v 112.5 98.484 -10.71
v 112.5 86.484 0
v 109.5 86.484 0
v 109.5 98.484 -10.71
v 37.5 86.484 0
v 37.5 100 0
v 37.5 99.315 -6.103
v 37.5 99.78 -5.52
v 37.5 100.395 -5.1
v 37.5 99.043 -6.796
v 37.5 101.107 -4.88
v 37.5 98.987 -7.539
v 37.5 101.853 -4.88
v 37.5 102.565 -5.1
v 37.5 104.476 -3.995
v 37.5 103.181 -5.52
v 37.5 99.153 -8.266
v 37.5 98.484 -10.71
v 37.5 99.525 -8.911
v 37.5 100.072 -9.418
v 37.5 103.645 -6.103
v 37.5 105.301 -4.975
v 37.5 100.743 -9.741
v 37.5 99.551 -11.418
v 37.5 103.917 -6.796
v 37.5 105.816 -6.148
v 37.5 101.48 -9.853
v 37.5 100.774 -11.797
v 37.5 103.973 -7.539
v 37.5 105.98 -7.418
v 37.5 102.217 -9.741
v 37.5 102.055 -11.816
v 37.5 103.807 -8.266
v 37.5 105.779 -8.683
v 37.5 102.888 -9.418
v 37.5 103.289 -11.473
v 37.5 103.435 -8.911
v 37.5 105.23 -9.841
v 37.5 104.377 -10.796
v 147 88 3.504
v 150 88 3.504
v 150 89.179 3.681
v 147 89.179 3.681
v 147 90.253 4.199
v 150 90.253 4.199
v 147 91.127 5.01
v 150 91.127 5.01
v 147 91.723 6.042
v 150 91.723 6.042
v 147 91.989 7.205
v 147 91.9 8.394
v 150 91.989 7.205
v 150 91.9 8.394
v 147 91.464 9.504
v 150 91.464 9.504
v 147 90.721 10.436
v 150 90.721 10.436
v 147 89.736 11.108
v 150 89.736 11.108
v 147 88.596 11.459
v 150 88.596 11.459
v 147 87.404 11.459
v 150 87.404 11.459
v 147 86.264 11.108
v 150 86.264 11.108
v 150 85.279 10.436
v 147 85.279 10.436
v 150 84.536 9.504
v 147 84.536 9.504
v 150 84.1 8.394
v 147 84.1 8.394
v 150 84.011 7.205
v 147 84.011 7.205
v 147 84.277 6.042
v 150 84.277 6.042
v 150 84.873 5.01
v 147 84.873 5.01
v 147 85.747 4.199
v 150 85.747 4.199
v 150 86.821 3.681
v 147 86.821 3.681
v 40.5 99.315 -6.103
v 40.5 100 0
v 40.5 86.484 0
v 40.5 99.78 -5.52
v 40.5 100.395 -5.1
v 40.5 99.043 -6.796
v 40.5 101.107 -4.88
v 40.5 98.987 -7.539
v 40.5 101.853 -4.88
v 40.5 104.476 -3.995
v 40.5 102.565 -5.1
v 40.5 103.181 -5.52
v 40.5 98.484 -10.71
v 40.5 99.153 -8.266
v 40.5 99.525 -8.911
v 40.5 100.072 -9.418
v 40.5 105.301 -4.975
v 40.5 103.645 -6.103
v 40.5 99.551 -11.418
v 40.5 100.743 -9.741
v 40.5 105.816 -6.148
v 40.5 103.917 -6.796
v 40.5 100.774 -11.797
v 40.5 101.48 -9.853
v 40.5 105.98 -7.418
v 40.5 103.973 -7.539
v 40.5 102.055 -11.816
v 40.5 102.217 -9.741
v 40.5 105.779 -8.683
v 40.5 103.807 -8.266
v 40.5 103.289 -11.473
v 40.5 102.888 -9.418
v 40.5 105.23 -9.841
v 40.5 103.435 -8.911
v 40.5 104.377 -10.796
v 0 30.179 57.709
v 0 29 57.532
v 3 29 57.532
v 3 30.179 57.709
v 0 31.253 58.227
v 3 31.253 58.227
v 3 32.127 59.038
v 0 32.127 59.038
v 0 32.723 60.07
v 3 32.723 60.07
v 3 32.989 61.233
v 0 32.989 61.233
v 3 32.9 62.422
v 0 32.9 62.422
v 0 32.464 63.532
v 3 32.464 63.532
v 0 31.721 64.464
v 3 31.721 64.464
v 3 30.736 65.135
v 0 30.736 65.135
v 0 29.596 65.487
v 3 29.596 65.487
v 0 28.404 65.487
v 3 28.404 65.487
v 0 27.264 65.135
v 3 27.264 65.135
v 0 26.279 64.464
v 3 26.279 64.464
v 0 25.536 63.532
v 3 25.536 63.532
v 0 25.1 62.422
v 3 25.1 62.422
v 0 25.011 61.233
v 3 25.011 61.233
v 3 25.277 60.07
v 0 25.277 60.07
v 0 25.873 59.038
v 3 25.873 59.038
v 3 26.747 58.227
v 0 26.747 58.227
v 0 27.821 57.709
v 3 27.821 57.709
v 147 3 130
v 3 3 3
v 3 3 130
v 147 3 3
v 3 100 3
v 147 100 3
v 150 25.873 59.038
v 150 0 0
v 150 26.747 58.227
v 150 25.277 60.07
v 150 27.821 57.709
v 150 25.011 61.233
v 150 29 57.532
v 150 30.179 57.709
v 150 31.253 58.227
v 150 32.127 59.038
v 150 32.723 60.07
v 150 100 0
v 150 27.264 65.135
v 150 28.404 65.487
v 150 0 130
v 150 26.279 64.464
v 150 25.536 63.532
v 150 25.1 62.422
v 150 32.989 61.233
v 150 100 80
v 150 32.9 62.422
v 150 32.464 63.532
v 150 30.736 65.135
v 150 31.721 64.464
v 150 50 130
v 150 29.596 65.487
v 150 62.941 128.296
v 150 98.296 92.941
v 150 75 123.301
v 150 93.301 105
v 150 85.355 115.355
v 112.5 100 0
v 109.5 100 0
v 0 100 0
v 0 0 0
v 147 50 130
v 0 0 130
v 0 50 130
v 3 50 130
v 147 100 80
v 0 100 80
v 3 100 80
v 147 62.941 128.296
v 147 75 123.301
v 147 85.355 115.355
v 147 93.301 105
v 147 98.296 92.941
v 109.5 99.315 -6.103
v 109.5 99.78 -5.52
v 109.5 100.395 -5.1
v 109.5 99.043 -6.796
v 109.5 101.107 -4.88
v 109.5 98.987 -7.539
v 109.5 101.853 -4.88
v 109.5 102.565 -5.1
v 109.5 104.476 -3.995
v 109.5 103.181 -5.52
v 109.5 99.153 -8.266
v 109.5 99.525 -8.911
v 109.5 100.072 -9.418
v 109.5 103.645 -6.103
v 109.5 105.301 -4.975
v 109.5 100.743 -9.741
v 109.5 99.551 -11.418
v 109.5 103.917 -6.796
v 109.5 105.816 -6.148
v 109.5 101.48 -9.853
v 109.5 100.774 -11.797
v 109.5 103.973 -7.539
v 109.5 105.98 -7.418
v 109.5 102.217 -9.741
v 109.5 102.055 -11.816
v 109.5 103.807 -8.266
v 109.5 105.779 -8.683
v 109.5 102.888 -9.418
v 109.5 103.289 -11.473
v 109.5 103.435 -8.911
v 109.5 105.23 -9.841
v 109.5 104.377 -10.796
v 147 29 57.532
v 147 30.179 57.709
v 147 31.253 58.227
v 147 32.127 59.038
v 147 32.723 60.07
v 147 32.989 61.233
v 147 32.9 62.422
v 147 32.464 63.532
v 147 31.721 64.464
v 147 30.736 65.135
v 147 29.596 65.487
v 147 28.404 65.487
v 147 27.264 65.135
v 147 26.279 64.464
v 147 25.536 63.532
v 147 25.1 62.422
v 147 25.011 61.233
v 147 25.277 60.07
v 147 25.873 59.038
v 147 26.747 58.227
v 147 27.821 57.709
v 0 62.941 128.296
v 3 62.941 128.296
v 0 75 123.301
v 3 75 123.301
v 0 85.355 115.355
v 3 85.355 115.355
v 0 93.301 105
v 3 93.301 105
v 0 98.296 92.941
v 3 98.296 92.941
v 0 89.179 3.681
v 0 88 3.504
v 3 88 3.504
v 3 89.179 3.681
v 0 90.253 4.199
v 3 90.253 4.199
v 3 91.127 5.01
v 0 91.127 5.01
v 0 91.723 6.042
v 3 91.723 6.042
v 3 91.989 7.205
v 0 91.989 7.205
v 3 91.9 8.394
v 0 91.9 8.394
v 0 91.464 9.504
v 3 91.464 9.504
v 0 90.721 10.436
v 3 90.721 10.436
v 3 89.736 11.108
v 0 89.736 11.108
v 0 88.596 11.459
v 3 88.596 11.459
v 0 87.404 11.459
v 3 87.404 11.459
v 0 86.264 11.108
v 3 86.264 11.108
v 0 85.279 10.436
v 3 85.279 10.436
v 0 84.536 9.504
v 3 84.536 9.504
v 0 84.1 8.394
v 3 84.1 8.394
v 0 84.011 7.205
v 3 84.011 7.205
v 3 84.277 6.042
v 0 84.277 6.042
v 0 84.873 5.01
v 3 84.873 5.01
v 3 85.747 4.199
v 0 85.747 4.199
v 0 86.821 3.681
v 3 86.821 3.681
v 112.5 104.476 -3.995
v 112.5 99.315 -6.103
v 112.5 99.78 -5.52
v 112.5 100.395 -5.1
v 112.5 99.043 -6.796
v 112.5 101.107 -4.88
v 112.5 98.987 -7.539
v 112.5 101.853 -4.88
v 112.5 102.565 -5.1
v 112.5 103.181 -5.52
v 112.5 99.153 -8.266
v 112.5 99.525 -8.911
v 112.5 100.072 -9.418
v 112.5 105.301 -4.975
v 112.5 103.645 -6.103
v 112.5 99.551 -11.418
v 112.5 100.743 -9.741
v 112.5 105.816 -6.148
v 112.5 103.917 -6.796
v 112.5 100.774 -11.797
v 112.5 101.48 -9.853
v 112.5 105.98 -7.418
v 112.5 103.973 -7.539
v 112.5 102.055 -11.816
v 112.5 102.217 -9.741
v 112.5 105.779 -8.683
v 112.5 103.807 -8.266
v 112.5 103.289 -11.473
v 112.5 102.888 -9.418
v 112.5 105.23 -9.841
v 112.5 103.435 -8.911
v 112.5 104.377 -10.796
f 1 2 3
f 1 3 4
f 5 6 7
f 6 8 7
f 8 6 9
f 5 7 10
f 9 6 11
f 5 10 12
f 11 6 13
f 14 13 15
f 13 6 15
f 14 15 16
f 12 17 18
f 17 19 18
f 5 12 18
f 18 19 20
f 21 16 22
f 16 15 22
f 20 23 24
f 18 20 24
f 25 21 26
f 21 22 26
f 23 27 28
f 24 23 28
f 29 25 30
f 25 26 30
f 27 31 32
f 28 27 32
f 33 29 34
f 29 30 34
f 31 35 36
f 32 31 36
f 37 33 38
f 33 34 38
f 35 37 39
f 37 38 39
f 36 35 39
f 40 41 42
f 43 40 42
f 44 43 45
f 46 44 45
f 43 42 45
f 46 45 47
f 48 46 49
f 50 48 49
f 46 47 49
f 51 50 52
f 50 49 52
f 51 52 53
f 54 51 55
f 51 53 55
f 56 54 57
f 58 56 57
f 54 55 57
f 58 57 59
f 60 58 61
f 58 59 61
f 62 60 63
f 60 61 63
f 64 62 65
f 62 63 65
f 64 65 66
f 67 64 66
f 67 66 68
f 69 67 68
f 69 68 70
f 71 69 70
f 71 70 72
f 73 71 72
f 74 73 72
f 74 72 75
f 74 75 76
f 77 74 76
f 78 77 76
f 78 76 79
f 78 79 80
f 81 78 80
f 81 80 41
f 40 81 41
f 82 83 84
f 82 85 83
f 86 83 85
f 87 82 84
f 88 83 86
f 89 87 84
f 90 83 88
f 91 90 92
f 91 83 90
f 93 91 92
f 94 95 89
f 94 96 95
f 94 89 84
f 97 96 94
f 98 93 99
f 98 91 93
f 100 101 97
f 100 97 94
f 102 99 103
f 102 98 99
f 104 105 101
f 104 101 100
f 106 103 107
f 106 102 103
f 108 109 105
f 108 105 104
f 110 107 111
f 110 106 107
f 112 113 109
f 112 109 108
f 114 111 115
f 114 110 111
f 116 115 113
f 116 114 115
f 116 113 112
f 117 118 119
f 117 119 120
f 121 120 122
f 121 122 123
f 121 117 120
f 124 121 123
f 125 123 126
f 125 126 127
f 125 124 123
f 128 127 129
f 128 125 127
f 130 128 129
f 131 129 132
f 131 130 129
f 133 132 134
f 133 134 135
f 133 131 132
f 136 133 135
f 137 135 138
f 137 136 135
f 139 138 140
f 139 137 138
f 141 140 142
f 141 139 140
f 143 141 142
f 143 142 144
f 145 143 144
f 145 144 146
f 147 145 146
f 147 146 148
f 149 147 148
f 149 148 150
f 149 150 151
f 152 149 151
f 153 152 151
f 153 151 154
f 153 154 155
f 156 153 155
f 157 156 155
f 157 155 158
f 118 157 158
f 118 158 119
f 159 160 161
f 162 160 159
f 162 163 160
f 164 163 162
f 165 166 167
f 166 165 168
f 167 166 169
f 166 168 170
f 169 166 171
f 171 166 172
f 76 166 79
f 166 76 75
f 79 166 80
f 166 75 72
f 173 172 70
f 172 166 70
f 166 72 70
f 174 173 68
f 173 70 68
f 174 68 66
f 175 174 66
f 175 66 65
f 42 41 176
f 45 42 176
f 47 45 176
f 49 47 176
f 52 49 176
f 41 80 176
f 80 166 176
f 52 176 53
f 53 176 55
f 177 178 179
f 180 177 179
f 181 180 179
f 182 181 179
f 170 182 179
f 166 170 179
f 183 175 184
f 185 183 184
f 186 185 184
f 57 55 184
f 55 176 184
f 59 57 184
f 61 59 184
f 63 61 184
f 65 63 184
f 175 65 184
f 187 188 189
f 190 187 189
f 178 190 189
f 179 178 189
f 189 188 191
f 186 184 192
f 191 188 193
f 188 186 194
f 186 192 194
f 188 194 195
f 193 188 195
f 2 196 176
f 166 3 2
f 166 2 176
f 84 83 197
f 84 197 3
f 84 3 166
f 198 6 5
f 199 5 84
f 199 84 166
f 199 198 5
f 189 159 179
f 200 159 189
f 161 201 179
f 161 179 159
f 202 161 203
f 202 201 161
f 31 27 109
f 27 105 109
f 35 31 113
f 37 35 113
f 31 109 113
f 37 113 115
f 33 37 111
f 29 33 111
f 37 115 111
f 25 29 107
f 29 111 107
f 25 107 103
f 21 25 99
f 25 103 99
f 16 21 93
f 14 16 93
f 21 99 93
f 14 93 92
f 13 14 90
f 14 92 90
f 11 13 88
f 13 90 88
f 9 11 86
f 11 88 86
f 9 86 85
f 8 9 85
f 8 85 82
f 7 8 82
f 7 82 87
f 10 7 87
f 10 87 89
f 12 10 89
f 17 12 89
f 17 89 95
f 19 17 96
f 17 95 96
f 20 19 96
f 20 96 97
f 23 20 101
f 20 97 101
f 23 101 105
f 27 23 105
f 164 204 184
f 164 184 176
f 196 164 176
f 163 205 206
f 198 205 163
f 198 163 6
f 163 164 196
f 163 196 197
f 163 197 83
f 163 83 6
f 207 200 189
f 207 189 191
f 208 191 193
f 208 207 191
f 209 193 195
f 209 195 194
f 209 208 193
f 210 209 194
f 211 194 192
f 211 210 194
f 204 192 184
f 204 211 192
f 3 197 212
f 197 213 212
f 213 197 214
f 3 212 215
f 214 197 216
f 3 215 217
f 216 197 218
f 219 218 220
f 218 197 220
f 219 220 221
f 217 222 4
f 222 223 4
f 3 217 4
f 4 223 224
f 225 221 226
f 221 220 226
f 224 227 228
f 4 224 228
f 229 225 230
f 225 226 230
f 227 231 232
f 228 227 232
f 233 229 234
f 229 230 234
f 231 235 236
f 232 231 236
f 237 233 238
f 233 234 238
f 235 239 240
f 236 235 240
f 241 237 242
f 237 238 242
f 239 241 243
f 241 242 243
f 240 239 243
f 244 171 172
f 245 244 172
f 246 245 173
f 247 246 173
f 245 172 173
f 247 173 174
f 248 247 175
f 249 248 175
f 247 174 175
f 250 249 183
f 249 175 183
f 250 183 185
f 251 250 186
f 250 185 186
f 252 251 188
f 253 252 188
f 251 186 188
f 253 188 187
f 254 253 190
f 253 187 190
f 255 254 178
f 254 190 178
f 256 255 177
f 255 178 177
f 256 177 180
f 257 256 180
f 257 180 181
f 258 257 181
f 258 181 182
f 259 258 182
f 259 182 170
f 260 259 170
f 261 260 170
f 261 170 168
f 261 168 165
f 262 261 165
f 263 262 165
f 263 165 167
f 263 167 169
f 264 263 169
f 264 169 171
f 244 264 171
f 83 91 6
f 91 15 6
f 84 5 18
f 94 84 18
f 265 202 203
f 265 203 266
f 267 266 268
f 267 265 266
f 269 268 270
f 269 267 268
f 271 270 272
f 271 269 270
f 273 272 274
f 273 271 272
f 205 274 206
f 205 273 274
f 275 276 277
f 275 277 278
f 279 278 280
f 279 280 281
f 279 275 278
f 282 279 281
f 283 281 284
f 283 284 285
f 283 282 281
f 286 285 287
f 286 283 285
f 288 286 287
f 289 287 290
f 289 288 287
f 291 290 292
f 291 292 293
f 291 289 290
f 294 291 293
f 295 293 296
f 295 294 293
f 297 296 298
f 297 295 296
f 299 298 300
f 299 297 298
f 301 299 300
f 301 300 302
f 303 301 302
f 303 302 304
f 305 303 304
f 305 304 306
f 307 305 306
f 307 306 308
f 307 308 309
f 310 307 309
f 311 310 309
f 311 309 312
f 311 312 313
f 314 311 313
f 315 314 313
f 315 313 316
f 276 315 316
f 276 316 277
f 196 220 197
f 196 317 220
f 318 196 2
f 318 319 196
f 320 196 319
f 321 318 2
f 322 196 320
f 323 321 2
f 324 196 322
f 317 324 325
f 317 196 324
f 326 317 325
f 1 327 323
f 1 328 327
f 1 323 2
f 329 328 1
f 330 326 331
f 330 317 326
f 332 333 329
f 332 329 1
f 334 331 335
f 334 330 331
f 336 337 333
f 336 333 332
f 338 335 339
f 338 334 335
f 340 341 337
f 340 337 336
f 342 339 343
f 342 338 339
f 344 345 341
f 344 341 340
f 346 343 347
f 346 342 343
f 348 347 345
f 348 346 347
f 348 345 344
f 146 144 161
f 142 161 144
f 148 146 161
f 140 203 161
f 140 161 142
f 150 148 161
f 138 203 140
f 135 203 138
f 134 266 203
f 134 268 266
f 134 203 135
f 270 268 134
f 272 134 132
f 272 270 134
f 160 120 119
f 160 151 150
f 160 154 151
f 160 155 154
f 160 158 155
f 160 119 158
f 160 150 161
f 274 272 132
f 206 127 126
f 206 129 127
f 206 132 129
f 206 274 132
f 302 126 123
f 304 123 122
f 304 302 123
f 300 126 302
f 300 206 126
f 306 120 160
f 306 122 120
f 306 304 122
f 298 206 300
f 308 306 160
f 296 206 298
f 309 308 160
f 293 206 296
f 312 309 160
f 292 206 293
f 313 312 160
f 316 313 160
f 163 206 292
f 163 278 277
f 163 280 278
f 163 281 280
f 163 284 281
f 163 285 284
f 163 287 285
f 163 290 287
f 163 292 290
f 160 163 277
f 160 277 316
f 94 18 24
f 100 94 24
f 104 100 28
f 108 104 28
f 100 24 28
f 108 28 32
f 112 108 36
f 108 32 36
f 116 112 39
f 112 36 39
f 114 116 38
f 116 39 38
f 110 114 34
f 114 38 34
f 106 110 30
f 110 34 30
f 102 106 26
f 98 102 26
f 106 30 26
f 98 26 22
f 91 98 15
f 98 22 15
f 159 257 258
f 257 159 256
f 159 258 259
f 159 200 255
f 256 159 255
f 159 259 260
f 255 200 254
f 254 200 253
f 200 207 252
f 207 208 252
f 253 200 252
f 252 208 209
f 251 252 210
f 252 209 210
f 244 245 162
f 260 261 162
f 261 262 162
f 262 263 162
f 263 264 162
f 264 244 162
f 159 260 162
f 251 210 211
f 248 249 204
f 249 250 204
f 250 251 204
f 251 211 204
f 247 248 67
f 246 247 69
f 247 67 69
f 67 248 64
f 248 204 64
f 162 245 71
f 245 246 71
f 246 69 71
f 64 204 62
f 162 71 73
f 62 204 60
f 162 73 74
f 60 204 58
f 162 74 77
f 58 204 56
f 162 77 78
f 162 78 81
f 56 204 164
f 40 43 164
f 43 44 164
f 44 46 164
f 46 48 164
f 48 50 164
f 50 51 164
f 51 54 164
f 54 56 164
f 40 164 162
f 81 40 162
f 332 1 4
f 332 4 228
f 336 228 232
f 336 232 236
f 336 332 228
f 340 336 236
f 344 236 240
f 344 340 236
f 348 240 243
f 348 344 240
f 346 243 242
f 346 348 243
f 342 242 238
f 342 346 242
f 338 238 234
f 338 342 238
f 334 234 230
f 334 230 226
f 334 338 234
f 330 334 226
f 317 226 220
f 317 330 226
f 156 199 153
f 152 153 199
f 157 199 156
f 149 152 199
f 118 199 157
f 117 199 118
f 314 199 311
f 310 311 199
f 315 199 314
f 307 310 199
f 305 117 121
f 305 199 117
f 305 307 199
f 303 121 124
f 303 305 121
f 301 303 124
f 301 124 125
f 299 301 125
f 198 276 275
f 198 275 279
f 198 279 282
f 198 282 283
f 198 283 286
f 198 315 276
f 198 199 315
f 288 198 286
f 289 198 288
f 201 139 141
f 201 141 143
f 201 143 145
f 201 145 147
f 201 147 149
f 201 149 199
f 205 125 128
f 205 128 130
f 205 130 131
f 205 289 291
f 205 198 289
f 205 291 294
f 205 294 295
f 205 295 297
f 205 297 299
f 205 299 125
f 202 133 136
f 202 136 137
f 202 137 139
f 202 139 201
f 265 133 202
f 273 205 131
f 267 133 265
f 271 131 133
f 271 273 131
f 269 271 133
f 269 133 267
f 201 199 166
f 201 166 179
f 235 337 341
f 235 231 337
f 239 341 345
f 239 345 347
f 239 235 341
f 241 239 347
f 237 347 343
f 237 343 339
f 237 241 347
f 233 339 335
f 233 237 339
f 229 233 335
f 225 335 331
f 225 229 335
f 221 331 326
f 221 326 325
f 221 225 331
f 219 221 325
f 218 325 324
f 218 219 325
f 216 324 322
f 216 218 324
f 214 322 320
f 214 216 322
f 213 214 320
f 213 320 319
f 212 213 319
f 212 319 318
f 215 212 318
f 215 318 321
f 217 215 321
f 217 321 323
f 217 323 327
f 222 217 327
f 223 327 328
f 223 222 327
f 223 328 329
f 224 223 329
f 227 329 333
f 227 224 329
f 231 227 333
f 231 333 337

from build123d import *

# Parameters (mm, degrees)
BOSS_EXTRUDE1_DEPTH = 150
SKETCH2_W           = 144
SKETCH2_H           = 132
CUT_EXTRUDE1_DEPTH  = 97
SKETCH3_R           = 2.5
BOSS_EXTRUDE2_DEPTH = 1.5
CUT_EXTRUDE2_REACH  = 227.015
SKETCH4_R           = 4


with BuildPart() as part:
    # Sketch1 → Boss-Extrude1 (new body)
    with BuildSketch(Plane(origin=(0, 0, 0), x_dir=(0, 0, -1), z_dir=(1, 0, 0))):
        with BuildLine():
            Line((0, 0), (-130, 0))
            Line((-130, 0), (-130, 50))
            ThreePointArc((-130, 50), (-115.355339059, 85.355339059), (-80, 100))
            Line((-80, 100), (0, 100))
            Line((0, 100), (0, 0))
        make_face()
    extrude(amount=BOSS_EXTRUDE1_DEPTH)

    # Sketch2 → Cut-Extrude1 (cut)
    with BuildSketch(Plane(origin=(0, 100, 0), x_dir=(1, 0, 0), z_dir=(0, 1, 0))):
        with Locations((75, -69)):
            Rectangle(SKETCH2_W, SKETCH2_H)
    extrude(amount=-CUT_EXTRUDE1_DEPTH, mode=Mode.SUBTRACT)

    # Sketch3 → Boss-Extrude2 (add, symmetric)
    with BuildSketch(Plane(origin=(111, 0, 0), x_dir=(0, 0, -1), z_dir=(1, 0, 0))):
        with BuildLine():
            Line((0, 100), (0, 86.483689179))
            Line((0, 86.483689179), (10.709846007, 98.483689179))
            ThreePointArc((10.709846007, 98.483689179), (10.348889249, 104.837405432), (3.995172996, 104.476448674))
            Line((3.995172996, 104.476448674), (0, 100))
        make_face()
        with Locations((7.352509502, 101.480068927)):
            Circle(SKETCH3_R, mode=Mode.SUBTRACT)
    boss_extrude2 = extrude(amount=BOSS_EXTRUDE2_DEPTH, both=True)

    # Mirror1: Boss-Extrude2 across plane
    add(boss_extrude2.mirror(Plane(origin=(75, 0, 0), x_dir=(0, 0, 1), z_dir=(1, 0, 0))))

    # Sketch4 → Cut-Extrude2 (cut, up to next)
    with BuildSketch(Plane(origin=(150, 0, 0), x_dir=(0, 0, -1), z_dir=(1, 0, 0)), mode=Mode.PRIVATE) as cut_extrude2_sk1:
        with Locations((-61.531516432, 29)):
            Circle(SKETCH4_R)
    cut_extrude2_tool1 = extrude(cut_extrude2_sk1.sketch, amount=-CUT_EXTRUDE2_REACH, mode=Mode.PRIVATE) & part.part
    # Sketch4 → Cut-Extrude2 (cut, up to next)
    with BuildSketch(Plane(origin=(150, 0, 0), x_dir=(0, 0, -1), z_dir=(1, 0, 0)), mode=Mode.PRIVATE) as cut_extrude2_sk2:
        with Locations((-7.503745795, 88)):
            Circle(SKETCH4_R)
    cut_extrude2_tool2 = extrude(cut_extrude2_sk2.sketch, amount=-CUT_EXTRUDE2_REACH, mode=Mode.PRIVATE) & part.part
    cut_extrude2_1 = cut_extrude2_tool1.solids().sort_by_distance((150, 29, 61.531516))[0]
    add(cut_extrude2_1, mode=Mode.SUBTRACT)
    cut_extrude2_2 = cut_extrude2_tool2.solids().sort_by_distance((150, 88, 7.503746))[0]
    add(cut_extrude2_2, mode=Mode.SUBTRACT)
    cut_extrude2 = cut_extrude2_1 + cut_extrude2_2  # Cut-Extrude2 as one shape, for the pattern or mirror that repeats it

    # Mirror2: Cut-Extrude2 across plane
    add(cut_extrude2.mirror(Plane(origin=(75, 0, 0), x_dir=(0, 0, 1), z_dir=(1, 0, 0))), mode=Mode.SUBTRACT)


solid = part.part
